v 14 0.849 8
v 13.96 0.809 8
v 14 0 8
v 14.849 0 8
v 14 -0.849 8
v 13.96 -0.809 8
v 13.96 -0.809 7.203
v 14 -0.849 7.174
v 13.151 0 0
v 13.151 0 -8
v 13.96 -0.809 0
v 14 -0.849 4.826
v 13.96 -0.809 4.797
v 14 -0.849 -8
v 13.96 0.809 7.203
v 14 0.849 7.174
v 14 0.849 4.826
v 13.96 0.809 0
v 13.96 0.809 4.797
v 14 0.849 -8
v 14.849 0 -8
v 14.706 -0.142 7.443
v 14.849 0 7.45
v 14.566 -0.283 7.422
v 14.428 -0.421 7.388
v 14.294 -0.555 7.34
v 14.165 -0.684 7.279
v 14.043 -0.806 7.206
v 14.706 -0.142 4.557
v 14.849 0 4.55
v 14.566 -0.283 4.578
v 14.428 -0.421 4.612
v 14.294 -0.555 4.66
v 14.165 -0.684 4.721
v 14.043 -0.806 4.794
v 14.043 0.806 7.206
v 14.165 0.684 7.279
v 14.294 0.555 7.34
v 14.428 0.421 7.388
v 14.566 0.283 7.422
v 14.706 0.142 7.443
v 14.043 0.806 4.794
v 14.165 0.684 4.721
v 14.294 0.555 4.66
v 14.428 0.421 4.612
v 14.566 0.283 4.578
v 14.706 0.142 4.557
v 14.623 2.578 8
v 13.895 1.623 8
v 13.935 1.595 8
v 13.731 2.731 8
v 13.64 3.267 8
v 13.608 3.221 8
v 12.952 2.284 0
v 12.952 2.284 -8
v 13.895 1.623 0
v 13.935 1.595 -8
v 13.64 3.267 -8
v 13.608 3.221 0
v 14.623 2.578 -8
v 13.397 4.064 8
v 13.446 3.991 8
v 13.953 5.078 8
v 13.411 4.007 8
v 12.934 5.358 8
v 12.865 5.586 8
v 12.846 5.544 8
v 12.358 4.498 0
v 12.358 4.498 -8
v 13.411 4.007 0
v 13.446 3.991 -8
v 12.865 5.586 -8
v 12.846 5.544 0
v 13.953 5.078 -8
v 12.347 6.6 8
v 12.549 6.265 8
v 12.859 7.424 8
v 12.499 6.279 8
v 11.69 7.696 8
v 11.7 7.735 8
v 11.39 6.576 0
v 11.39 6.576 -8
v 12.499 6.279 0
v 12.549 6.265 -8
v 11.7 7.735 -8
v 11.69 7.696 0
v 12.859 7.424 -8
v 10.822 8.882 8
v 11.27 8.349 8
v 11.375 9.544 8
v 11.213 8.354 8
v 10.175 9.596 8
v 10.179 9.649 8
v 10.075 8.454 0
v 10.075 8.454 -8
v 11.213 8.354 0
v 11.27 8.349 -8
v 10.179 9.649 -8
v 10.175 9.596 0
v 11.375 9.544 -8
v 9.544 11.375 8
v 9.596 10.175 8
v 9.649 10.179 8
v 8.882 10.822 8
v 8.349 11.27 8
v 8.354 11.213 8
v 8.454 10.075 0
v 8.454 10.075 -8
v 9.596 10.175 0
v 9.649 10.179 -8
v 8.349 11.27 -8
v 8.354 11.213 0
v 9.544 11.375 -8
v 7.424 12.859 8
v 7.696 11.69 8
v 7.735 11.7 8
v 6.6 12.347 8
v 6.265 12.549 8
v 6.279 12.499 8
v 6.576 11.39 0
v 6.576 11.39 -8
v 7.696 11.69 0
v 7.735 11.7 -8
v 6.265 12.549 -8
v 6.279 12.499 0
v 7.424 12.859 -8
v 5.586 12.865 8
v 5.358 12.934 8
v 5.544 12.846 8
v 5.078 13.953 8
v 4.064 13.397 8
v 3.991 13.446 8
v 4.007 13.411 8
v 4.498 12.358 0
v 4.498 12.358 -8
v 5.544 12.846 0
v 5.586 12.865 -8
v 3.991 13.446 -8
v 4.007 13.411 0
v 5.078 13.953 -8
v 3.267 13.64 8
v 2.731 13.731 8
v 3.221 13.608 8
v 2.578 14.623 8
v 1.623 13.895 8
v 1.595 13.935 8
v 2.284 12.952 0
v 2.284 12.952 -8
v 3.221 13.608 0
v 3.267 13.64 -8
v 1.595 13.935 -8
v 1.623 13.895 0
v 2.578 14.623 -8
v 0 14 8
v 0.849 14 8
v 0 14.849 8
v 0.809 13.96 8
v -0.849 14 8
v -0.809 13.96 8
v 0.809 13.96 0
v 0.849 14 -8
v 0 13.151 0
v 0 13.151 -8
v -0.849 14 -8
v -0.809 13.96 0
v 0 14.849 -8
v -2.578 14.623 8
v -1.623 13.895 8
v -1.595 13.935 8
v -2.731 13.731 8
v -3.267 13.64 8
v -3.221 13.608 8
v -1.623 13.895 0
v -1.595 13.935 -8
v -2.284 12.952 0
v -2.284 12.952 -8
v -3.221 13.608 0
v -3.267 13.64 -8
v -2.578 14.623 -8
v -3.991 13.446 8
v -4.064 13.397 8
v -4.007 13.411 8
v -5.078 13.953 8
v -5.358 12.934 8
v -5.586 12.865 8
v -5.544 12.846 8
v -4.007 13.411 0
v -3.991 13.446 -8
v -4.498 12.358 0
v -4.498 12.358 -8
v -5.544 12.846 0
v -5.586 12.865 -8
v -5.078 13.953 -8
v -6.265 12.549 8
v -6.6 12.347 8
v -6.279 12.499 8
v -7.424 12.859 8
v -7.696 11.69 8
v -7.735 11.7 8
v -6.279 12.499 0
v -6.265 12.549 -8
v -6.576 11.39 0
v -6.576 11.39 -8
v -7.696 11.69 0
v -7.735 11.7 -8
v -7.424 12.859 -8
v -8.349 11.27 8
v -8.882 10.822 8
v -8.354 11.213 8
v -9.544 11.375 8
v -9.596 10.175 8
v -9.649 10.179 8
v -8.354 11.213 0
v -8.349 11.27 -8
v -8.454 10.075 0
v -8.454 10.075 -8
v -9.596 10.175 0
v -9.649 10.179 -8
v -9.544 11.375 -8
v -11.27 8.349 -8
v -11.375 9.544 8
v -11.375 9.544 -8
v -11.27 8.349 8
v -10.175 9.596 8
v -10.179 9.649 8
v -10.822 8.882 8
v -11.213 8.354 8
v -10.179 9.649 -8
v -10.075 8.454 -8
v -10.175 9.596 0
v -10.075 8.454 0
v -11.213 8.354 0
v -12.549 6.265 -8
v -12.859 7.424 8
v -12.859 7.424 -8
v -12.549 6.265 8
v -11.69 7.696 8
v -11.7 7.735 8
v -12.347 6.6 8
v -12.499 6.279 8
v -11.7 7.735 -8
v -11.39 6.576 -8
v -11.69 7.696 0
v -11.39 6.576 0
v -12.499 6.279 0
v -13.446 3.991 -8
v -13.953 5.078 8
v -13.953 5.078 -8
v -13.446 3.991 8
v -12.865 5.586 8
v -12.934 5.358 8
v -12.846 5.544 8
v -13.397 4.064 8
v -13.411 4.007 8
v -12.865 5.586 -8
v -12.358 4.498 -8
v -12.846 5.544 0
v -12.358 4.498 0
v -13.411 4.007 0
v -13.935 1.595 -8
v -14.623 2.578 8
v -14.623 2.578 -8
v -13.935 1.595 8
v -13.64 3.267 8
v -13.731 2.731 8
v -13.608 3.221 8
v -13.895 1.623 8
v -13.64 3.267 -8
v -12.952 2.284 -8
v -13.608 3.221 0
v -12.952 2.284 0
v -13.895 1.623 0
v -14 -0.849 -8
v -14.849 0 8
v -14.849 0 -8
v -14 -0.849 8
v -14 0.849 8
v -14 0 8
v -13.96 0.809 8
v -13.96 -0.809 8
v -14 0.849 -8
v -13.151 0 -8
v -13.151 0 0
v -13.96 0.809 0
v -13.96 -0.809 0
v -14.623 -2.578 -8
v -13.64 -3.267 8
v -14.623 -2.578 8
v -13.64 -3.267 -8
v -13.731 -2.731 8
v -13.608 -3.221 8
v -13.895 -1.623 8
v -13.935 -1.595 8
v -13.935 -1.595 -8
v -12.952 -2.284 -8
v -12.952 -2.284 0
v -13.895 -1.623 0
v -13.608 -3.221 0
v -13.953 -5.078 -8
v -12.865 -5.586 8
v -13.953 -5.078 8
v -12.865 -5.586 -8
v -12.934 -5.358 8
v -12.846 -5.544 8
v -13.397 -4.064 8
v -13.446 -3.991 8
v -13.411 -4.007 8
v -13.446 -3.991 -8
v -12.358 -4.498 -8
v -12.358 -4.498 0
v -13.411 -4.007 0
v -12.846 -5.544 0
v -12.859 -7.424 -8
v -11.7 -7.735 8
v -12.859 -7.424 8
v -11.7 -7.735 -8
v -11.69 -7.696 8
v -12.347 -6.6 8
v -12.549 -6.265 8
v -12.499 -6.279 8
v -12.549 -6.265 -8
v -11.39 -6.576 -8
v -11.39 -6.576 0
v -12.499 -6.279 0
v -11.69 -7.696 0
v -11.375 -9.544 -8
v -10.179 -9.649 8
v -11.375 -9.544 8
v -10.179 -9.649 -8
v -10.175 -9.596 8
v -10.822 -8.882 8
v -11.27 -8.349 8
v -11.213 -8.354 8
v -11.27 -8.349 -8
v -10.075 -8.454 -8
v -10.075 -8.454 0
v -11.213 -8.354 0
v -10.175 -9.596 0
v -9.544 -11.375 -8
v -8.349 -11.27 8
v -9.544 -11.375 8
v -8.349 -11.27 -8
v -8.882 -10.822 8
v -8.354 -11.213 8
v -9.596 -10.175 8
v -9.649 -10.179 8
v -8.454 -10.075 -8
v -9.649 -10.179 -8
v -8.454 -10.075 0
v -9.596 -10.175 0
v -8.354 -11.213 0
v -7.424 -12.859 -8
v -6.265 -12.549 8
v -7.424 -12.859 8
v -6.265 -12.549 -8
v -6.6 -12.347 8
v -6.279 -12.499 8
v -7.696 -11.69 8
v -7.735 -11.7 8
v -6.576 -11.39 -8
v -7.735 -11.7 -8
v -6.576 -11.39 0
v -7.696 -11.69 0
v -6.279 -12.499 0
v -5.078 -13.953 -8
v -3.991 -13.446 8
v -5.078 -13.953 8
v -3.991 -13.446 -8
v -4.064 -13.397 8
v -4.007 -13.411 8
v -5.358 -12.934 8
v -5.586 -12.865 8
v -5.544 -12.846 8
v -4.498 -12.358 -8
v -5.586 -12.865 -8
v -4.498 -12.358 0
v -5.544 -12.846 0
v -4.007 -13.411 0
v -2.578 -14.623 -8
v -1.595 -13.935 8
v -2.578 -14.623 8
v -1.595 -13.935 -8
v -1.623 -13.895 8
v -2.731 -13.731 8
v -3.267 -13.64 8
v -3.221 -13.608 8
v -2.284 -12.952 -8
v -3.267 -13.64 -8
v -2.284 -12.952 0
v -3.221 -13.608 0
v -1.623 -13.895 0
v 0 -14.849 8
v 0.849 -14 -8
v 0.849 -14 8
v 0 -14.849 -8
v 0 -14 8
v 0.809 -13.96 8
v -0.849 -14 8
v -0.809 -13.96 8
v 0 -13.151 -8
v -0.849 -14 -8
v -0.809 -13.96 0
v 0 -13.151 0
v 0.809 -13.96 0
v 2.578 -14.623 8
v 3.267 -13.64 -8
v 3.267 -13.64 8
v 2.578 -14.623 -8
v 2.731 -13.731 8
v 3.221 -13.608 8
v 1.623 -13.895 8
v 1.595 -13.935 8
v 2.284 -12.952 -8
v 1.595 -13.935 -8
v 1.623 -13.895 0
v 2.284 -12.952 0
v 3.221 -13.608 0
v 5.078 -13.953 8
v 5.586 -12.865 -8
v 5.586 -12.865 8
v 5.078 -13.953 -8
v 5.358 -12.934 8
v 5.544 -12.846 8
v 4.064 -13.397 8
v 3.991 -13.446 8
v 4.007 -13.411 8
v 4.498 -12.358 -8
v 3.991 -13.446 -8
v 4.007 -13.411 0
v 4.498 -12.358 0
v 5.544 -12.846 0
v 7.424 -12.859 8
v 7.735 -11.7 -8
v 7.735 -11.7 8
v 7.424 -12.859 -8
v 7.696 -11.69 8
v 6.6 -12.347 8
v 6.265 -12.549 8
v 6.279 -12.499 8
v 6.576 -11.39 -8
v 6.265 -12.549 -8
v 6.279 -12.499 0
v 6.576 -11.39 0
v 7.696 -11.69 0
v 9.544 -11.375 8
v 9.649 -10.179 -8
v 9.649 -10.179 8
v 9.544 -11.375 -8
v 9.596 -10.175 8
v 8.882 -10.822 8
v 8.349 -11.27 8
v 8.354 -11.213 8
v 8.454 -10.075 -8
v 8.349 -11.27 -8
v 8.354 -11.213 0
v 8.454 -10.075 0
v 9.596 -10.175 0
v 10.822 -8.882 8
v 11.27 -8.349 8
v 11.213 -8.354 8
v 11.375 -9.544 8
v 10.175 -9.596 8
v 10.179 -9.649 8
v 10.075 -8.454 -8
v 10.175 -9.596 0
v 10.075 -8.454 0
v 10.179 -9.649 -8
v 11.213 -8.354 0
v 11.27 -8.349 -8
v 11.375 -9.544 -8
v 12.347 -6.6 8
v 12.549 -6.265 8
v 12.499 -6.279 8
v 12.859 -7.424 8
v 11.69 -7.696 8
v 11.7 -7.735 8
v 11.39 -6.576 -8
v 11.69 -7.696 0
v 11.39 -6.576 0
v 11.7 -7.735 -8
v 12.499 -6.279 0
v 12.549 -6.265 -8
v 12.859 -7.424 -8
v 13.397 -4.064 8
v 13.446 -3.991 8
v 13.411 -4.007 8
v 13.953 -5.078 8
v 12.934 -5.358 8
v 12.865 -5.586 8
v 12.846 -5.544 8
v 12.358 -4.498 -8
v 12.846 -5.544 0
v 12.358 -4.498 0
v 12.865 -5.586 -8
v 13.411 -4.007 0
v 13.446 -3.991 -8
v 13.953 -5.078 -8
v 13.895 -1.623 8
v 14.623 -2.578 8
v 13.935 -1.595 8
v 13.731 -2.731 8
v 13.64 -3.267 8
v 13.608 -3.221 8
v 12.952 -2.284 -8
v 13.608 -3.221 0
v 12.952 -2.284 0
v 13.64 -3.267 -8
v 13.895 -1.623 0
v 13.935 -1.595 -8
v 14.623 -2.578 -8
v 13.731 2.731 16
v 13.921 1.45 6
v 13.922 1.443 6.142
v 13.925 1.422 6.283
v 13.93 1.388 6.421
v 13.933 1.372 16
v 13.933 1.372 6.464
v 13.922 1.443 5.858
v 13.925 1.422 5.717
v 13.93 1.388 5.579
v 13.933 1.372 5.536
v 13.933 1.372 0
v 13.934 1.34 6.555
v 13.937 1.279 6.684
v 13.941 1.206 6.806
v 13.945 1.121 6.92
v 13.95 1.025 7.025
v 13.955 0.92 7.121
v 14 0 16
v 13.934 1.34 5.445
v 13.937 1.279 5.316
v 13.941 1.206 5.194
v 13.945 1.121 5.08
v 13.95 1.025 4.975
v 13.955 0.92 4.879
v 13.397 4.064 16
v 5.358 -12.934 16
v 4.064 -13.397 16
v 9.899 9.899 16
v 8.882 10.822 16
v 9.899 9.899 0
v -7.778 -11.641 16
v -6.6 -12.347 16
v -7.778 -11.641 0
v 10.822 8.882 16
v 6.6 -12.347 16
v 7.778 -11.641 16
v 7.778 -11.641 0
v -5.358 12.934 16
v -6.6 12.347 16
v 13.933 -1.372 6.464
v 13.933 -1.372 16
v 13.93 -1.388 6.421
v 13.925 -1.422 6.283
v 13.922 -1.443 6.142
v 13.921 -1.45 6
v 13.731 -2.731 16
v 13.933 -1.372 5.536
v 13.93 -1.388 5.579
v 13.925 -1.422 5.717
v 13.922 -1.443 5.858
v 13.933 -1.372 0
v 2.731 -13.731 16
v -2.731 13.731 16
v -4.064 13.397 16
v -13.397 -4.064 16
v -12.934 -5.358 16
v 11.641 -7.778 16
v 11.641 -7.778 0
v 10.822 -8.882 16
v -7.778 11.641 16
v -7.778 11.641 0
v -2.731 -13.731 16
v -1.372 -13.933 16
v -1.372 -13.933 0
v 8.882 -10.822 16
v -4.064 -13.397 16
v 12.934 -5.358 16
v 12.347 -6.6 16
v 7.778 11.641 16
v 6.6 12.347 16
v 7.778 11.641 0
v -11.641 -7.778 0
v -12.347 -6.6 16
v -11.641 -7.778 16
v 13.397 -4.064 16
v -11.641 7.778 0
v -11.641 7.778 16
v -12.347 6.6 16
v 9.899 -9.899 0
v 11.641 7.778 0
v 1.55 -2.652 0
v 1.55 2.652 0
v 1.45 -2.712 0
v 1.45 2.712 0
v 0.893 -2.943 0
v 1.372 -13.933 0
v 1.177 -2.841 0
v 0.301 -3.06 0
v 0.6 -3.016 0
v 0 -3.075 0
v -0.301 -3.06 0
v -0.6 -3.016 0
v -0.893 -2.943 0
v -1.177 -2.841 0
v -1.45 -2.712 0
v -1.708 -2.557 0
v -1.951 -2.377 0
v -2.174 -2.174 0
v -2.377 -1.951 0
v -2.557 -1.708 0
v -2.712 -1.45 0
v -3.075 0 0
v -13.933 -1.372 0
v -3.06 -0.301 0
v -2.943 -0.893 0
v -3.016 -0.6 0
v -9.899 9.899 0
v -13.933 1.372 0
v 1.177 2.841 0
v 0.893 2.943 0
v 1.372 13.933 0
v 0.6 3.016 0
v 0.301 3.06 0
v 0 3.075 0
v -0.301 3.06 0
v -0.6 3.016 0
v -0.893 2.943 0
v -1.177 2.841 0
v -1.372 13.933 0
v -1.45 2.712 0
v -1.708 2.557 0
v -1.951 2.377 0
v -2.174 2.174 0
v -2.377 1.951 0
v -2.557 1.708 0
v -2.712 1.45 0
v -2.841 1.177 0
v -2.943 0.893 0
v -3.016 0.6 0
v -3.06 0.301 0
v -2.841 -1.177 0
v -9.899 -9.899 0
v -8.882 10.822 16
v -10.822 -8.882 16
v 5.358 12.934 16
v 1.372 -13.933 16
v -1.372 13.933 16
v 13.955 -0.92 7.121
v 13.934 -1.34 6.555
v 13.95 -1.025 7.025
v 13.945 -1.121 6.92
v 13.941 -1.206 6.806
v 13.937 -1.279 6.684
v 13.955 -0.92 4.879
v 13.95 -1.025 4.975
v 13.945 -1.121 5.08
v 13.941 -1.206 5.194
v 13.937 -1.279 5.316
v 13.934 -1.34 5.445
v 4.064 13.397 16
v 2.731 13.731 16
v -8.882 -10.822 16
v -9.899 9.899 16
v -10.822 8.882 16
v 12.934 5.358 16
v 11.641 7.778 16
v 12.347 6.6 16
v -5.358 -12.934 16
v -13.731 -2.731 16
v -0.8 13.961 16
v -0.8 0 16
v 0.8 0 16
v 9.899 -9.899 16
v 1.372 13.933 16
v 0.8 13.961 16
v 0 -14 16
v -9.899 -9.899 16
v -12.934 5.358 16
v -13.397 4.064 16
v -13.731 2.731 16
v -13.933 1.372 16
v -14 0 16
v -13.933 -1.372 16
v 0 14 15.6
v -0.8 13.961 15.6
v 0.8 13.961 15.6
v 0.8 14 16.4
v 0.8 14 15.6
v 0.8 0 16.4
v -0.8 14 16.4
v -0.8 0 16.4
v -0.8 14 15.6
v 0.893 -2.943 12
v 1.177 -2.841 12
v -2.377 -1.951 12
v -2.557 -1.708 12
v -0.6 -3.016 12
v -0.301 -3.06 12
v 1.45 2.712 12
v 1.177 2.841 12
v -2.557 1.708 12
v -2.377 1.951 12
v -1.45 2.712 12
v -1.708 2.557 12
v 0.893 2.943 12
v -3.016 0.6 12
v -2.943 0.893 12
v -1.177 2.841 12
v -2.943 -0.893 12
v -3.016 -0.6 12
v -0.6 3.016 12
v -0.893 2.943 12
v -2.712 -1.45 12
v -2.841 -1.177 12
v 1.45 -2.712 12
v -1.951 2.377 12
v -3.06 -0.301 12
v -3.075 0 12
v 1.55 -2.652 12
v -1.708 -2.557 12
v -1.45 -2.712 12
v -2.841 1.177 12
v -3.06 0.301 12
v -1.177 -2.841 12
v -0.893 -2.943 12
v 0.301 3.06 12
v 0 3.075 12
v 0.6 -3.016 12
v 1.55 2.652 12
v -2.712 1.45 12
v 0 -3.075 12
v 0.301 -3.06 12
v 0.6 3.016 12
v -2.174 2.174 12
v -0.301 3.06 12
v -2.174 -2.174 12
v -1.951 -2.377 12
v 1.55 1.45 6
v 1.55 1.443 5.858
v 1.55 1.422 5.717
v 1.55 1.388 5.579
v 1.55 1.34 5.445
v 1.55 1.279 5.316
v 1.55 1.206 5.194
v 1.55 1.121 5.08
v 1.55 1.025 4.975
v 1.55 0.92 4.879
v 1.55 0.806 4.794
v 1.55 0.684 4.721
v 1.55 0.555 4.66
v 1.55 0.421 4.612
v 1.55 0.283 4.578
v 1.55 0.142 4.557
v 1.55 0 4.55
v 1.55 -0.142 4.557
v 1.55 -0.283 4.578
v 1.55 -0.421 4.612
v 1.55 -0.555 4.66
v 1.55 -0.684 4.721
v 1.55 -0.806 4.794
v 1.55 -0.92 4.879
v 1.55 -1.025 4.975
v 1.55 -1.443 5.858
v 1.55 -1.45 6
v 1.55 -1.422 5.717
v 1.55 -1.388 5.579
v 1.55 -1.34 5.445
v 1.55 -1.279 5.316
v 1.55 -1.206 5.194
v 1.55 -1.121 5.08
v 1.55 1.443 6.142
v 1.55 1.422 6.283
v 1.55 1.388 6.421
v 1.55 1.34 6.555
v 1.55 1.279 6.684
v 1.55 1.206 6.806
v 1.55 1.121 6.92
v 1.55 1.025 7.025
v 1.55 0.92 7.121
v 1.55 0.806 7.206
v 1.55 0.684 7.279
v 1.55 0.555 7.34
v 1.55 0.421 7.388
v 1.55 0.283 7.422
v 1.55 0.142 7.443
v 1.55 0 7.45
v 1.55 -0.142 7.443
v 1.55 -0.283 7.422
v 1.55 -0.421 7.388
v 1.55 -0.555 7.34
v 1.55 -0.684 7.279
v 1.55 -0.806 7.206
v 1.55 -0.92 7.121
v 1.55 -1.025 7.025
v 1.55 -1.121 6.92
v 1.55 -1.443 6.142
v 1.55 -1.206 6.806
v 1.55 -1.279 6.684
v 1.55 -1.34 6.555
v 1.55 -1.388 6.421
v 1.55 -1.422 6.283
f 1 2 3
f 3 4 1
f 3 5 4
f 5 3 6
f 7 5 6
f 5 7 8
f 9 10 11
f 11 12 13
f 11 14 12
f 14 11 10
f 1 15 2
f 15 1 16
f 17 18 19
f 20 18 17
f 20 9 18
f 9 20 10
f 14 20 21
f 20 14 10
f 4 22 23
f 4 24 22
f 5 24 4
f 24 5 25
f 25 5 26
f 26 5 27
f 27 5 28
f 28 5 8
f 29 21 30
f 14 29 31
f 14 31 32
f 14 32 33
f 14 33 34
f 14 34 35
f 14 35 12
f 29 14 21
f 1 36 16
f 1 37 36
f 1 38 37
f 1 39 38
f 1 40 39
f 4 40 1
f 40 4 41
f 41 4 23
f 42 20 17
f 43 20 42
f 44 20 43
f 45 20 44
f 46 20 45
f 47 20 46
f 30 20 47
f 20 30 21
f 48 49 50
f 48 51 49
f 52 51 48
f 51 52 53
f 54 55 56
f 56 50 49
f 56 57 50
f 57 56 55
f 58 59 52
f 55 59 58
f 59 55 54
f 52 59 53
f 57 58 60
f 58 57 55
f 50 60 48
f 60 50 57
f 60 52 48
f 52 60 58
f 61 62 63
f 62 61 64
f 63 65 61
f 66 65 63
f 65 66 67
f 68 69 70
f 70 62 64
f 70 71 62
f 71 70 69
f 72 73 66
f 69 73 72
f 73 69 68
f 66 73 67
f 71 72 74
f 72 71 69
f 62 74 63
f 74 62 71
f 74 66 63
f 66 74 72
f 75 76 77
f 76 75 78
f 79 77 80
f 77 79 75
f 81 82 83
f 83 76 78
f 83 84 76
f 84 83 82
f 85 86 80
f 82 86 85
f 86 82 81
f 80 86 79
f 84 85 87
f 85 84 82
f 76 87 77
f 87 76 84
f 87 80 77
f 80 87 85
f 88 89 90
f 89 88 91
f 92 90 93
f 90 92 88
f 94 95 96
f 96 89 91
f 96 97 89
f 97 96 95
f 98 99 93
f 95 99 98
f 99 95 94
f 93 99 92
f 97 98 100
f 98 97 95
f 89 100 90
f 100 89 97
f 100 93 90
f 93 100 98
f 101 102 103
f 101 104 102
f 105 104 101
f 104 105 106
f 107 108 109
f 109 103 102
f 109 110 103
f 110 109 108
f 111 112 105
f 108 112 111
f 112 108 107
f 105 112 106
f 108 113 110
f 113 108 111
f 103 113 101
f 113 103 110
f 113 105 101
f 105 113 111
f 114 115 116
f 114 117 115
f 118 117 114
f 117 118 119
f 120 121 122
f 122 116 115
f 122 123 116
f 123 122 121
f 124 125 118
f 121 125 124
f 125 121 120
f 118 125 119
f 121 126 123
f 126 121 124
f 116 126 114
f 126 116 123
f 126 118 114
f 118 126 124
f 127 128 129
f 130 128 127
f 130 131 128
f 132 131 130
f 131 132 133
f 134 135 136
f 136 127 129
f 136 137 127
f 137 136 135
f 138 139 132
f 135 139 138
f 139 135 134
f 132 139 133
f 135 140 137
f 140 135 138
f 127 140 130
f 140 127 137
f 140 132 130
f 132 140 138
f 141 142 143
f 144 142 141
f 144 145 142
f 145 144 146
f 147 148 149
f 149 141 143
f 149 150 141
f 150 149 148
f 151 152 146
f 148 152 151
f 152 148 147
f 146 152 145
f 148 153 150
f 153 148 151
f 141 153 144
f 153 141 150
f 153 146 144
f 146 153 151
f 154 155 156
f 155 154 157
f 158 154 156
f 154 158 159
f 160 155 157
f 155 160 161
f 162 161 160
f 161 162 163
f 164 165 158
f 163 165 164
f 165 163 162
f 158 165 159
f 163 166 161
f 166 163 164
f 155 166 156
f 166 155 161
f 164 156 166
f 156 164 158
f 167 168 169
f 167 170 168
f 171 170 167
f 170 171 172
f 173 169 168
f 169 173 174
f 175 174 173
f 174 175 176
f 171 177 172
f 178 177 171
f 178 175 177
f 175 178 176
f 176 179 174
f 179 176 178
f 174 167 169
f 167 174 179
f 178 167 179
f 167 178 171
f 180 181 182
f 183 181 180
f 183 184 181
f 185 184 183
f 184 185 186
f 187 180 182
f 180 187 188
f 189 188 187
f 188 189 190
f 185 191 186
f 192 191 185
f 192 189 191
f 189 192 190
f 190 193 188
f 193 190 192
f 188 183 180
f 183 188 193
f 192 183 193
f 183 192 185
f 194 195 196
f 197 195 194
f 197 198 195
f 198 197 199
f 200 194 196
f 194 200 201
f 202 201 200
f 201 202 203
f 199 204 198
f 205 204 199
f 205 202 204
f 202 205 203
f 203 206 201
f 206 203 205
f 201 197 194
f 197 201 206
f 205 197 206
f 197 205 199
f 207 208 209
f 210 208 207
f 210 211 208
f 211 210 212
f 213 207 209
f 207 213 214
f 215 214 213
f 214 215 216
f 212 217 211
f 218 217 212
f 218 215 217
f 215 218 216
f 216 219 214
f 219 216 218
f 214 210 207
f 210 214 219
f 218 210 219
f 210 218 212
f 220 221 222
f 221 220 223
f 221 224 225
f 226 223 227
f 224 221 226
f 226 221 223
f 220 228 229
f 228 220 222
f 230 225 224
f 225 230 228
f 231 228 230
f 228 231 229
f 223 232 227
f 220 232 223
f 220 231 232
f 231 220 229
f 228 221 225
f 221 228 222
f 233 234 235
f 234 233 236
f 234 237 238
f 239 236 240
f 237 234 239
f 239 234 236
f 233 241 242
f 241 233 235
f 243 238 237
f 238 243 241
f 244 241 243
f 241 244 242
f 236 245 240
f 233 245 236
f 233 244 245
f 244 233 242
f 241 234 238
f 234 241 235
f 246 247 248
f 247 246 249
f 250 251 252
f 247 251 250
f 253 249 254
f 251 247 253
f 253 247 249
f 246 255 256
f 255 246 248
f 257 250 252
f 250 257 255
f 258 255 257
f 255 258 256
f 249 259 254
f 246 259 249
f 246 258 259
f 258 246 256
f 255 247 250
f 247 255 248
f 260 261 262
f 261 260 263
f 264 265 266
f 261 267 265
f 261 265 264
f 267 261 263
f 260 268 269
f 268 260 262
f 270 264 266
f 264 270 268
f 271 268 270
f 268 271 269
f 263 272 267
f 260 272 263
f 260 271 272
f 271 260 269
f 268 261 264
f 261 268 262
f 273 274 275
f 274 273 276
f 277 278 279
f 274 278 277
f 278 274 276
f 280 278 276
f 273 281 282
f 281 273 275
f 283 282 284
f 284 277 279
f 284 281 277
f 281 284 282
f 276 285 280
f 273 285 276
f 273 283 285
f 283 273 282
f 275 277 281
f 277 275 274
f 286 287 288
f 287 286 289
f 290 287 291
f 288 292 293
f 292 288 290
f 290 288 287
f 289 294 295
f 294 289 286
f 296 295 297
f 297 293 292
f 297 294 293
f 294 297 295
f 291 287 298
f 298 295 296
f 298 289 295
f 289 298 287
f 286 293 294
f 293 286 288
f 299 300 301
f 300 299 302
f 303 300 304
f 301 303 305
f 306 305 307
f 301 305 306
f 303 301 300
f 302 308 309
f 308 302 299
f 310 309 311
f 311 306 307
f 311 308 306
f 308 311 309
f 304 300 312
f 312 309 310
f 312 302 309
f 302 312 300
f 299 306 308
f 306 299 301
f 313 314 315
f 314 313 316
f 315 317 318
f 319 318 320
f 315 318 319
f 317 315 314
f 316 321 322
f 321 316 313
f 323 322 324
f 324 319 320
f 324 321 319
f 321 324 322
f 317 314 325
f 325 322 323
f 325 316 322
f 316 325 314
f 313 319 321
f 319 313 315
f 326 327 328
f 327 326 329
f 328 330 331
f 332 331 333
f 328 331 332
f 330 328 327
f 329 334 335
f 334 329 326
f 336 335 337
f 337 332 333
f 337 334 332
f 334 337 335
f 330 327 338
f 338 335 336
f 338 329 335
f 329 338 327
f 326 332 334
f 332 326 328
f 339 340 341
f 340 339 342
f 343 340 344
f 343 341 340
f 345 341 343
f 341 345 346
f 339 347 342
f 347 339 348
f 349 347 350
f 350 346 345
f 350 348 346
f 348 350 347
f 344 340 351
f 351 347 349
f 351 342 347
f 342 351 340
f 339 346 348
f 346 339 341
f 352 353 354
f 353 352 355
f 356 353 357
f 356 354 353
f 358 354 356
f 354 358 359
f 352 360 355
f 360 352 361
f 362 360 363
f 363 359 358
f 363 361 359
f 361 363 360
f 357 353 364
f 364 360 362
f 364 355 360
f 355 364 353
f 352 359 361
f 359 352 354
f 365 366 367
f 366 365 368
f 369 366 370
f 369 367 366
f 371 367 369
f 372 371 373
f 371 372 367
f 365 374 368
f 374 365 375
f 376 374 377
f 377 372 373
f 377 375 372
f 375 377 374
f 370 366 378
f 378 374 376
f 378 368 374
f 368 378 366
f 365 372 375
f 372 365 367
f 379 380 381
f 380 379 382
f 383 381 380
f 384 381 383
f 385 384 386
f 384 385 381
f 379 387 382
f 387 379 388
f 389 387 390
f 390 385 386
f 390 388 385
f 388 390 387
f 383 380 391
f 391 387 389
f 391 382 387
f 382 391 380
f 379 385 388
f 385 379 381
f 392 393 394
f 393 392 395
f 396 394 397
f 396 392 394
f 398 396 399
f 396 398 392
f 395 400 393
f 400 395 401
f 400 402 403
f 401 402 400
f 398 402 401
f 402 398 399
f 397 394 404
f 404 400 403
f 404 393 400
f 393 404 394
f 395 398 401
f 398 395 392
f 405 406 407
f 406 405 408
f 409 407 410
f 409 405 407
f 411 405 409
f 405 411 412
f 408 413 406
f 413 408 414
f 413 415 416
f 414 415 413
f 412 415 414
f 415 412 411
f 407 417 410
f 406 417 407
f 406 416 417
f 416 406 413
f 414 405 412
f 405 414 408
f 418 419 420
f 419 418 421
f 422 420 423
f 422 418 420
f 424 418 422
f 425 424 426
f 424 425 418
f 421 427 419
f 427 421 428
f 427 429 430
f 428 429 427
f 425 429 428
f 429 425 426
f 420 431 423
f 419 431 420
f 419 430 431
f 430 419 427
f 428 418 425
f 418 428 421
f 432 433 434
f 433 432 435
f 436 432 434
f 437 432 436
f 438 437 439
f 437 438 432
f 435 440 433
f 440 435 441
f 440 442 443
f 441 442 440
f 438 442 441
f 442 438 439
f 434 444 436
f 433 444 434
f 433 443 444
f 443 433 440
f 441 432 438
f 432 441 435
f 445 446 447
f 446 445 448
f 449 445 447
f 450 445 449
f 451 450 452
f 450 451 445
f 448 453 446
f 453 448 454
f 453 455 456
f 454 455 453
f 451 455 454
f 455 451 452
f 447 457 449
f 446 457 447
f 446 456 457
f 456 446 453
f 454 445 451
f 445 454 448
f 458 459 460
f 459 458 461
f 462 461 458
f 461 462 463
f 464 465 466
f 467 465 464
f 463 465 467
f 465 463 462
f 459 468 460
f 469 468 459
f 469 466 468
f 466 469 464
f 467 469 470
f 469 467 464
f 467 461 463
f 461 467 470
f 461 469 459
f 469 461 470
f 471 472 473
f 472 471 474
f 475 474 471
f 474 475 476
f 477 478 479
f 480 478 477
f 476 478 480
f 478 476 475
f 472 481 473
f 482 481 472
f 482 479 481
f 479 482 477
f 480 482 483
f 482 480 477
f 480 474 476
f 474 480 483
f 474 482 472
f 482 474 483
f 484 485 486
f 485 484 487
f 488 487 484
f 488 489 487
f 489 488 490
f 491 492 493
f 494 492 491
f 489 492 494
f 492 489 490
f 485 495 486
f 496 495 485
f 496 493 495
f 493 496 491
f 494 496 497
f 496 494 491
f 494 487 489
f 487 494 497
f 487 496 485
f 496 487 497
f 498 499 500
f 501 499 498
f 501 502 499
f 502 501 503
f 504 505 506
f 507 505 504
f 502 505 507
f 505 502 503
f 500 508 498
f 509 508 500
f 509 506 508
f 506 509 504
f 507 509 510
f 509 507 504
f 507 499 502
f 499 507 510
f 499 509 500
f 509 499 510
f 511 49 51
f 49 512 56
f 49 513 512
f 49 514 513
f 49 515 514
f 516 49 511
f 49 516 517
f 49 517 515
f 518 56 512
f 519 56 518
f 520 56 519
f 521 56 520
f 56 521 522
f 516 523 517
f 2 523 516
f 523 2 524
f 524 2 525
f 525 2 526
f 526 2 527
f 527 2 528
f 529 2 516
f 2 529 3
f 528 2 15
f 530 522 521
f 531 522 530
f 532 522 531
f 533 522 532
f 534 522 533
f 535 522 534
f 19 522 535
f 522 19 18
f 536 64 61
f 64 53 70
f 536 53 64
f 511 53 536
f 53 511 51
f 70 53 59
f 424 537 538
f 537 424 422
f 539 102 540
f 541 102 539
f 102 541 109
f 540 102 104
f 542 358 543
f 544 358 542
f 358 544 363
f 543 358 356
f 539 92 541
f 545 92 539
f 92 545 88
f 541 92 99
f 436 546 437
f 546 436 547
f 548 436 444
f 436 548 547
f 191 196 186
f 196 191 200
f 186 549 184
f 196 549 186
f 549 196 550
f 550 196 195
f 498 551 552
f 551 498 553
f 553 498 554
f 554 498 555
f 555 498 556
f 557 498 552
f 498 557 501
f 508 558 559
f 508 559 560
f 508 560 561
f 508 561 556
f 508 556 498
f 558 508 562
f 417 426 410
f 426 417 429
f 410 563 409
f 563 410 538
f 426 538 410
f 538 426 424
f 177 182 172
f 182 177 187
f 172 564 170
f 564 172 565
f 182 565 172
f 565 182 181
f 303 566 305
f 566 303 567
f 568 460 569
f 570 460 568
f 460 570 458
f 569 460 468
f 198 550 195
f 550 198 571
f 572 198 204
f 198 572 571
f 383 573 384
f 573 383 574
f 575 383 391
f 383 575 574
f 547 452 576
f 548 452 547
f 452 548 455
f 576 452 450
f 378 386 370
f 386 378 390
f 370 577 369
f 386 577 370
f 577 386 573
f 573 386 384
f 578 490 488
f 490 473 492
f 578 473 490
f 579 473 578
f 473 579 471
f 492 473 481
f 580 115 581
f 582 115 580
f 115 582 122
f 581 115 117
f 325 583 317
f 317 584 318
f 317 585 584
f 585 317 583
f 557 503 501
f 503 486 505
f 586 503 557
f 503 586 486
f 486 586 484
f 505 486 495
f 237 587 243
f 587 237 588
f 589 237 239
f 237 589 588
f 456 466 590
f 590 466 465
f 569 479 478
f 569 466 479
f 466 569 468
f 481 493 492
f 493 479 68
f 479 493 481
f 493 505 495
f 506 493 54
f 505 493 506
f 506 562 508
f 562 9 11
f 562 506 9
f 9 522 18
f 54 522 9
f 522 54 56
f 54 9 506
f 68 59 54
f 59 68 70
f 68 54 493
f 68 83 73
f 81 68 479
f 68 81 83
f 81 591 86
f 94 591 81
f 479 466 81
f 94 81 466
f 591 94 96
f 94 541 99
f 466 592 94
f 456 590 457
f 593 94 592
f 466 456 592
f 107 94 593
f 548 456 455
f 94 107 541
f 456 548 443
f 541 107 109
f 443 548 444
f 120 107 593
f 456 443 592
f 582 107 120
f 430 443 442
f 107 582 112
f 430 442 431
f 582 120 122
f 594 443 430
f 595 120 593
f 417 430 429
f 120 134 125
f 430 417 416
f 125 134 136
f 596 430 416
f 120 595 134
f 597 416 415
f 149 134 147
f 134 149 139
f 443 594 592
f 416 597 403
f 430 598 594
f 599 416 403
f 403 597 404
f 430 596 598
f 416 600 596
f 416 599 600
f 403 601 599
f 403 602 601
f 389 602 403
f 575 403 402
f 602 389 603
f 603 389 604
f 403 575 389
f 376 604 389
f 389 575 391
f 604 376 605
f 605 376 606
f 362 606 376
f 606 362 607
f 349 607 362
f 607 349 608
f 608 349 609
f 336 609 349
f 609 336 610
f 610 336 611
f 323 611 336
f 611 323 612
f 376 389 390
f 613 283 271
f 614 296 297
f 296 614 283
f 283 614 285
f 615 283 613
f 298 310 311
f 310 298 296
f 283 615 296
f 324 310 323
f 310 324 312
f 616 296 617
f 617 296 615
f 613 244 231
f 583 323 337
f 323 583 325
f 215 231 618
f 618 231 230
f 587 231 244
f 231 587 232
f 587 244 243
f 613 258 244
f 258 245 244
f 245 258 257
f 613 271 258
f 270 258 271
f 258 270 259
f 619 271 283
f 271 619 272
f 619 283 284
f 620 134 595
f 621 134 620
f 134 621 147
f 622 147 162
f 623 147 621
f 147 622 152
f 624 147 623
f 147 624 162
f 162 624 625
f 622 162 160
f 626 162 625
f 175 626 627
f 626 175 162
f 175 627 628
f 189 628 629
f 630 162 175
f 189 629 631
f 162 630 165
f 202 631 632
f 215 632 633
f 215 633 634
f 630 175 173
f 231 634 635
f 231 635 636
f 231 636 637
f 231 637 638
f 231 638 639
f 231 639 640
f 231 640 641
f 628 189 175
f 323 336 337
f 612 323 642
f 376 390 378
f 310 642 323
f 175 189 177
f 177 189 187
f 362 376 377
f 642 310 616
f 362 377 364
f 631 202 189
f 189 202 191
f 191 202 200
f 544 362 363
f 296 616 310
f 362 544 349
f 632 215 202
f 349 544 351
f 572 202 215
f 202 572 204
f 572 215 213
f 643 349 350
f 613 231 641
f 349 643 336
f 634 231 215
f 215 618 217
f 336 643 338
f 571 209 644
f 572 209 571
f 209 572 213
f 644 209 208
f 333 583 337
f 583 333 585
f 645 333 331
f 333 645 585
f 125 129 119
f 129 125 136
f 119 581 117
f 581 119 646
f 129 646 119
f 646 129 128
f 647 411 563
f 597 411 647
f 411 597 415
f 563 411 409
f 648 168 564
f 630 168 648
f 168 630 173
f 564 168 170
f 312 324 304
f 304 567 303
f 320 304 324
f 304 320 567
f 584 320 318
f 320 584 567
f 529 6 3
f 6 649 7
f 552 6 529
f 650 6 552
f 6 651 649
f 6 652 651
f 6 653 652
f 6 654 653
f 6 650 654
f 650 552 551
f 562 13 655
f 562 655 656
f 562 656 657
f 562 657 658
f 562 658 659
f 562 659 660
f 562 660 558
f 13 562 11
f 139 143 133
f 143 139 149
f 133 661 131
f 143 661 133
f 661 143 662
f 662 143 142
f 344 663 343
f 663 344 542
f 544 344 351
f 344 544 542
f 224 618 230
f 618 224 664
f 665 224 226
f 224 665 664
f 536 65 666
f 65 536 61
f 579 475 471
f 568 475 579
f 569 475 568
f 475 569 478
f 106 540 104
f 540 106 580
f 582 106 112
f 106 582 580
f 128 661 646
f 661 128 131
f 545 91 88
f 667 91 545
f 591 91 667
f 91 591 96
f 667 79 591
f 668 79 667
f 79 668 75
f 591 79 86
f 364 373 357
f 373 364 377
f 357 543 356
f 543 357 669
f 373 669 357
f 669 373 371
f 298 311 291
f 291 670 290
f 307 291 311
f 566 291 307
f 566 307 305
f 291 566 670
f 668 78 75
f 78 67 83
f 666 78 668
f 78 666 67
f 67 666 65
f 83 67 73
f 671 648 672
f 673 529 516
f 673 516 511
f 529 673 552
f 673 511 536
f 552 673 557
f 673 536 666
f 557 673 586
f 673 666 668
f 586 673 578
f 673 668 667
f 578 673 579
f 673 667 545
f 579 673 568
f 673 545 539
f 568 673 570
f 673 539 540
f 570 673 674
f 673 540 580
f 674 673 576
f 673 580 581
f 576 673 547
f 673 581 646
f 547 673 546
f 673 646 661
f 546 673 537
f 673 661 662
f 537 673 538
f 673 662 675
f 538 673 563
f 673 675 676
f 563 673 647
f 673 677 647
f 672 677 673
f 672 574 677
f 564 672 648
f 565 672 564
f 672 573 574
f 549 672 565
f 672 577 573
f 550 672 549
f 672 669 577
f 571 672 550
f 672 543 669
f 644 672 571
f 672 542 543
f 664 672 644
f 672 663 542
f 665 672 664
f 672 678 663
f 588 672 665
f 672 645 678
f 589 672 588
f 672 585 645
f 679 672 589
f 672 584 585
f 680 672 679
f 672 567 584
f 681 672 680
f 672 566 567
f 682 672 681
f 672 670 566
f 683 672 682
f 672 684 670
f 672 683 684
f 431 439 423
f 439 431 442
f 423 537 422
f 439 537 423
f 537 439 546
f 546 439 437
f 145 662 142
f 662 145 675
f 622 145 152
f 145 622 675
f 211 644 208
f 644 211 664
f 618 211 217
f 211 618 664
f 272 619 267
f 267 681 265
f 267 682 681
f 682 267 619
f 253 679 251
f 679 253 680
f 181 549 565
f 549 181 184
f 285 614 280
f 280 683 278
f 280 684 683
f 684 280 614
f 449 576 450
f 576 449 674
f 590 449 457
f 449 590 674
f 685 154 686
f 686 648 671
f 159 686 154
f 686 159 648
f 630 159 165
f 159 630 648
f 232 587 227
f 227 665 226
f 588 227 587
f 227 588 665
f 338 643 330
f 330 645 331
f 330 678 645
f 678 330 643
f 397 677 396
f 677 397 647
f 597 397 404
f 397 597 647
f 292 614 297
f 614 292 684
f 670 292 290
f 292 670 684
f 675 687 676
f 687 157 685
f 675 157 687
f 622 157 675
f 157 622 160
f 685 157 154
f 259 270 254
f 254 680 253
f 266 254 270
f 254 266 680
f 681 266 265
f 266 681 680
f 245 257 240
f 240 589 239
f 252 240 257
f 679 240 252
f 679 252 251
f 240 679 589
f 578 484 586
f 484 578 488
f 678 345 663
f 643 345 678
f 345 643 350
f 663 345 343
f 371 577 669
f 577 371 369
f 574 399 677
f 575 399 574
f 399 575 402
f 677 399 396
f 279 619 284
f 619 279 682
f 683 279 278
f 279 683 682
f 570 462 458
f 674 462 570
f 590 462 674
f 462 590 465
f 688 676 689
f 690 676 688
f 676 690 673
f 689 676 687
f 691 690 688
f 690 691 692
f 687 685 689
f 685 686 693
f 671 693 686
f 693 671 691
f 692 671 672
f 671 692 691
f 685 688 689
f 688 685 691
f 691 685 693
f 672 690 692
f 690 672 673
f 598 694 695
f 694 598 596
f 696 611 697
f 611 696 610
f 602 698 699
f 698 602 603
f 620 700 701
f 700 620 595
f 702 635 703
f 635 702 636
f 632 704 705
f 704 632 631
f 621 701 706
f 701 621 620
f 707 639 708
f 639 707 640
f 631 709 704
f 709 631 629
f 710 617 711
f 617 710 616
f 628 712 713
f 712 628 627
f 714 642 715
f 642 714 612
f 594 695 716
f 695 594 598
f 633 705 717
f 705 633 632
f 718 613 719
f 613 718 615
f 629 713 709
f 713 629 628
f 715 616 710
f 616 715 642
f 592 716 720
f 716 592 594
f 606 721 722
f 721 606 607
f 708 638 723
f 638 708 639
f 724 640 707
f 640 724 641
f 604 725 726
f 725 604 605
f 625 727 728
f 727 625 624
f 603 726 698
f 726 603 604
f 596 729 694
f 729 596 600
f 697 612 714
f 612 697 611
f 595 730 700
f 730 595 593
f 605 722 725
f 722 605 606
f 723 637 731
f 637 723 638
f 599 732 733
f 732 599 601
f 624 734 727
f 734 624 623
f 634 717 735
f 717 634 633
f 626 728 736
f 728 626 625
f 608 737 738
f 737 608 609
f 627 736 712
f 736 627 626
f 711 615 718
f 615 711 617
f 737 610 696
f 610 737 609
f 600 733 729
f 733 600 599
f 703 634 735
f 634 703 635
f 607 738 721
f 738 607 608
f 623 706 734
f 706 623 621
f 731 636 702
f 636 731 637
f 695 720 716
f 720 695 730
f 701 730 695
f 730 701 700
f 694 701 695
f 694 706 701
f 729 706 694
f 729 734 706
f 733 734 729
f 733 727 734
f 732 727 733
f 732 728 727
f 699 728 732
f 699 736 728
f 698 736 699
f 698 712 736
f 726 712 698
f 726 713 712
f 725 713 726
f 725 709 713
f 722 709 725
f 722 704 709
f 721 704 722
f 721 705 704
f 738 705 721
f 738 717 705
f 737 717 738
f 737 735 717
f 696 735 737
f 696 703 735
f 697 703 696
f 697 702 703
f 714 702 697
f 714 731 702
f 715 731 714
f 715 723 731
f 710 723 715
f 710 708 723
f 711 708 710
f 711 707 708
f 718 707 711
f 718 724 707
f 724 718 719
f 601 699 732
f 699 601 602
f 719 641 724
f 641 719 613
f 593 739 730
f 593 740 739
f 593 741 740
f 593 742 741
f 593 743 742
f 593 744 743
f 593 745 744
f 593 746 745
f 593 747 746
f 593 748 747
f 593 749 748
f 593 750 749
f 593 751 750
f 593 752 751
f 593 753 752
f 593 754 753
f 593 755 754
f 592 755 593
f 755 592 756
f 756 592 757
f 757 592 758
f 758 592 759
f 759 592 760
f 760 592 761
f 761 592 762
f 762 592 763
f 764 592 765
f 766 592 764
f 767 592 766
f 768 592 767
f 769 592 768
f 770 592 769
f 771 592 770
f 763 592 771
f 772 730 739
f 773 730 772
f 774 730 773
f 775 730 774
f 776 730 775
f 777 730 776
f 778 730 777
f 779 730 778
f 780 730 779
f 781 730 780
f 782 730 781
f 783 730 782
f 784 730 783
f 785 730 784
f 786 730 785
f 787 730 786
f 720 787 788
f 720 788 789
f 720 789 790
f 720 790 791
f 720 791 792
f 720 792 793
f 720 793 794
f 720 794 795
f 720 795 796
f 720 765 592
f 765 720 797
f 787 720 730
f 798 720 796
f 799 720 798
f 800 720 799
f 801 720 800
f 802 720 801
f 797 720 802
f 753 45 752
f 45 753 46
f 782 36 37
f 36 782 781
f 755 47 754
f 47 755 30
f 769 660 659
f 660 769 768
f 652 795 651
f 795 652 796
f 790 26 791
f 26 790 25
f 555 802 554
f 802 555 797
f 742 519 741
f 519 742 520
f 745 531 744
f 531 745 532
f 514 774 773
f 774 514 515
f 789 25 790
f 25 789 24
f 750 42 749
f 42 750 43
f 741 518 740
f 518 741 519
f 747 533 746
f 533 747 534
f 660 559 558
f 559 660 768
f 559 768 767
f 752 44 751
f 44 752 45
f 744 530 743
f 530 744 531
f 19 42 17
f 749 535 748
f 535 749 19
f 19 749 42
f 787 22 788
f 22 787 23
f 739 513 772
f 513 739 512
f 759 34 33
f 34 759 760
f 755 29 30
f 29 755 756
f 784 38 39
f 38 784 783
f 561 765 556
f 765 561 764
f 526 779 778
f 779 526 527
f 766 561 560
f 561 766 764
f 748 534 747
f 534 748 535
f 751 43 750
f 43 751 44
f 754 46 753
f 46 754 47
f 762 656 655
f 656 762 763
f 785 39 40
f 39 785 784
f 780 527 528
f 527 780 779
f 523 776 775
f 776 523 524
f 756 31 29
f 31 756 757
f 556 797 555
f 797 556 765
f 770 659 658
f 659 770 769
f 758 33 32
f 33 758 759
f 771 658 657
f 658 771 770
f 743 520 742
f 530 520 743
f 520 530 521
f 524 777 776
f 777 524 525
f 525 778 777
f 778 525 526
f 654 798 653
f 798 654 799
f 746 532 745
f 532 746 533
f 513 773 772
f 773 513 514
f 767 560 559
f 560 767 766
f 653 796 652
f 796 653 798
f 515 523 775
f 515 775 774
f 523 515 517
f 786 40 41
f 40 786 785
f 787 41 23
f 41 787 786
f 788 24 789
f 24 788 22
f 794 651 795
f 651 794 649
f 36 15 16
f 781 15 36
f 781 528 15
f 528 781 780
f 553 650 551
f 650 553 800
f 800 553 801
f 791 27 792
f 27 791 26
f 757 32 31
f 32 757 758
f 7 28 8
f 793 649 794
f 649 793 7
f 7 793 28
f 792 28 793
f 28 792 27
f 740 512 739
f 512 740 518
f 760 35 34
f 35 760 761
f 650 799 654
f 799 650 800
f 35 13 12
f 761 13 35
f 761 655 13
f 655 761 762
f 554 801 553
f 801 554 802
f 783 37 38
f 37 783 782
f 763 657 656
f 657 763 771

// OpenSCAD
// ====================================================================
// PARAMETRIC MAKER FORGE - KNOB & DIAL REPLACEMENT ENGINE
// D-Shaft, 18T/24T Splined, Knurled, Fluted & Set-Screw Retention
// ====================================================================

$fn = 64;

/* [Shaft Fitting] */
Shaft_Profile    = "D_SHAFT"; // [D_SHAFT:D-Shaft Flat, ROUND_SET_SCREW:Smooth Round with M3 Set Screw, SPLINED_18T:18-Tooth Potentiometer Spline, HEX_SHAFT:Hexagonal Socket]
Shaft_Dia        = 6.0;  // 6.0mm or 6.35mm (1/4 inch)
D_Flat_Depth     = 1.5;  // Depth of the D flat
Shaft_Depth      = 12.0; // Engagement depth

/* [Knob Outer Dimensions] */
Knob_Diameter    = 28.0; // [14:1:80]
Knob_Height      = 16.0; // [8:1:50]
Grip_Texture     = "DIAMOND_KNURL"; // [DIAMOND_KNURL:Diamond Knurled, FLUTED_RIBS:Vertical Finger Flutes, SMOOTH_POINTER:Smooth with Indicator Notch]
Rib_Count        = 18;

/* [Pointer & Indicators] */
Enable_Pointer   = true;
Pointer_Style    = "EMBOSSED_LINE"; // [EMBOSSED_LINE:Raised Line, DEBOSSED_DOT:Debossed Dot]

// ====================================================================
// TOP-LEVEL RENDER
// ====================================================================
color([0.25, 0.25, 0.28]) Knob_Assembly();

module Knob_Assembly() {
    difference() {
        union() {
            // Main knob body
            cylinder(d=Knob_Diameter, h=Knob_Height);

            // Grip texture on perimeter
            if (Grip_Texture == "FLUTED_RIBS") {
                for (i = [0 : Rib_Count - 1]) {
                    rotate([0, 0, i * (360 / Rib_Count)])
                        translate([Knob_Diameter / 2, 0, 0])
                        cylinder(d=2.0, h=Knob_Height);
                }
            } else if (Grip_Texture == "DIAMOND_KNURL") {
                for (i = [0 : Rib_Count * 2 - 1]) {
                    rotate([0, 0, i * (180 / Rib_Count)])
                        translate([Knob_Diameter / 2, 0, 0])
                        rotate([0, 0, 45])
                        cube([1.2, 1.2, Knob_Height], center=true);
                }
            }

            // Pointer indicator
            if (Enable_Pointer && Pointer_Style == "EMBOSSED_LINE") {
                translate([0, Knob_Diameter / 4, Knob_Height])
                    cube([1.6, Knob_Diameter / 2, 0.8], center=true);
            }
        }

        // Shaft socket cavity
        translate([0, 0, -1]) {
            if (Shaft_Profile == "D_SHAFT") {
                difference() {
                    cylinder(d=Shaft_Dia + 0.15, h=Shaft_Depth + 1);
                    translate([Shaft_Dia / 2 - D_Flat_Depth + 0.05, -Shaft_Dia, 0])
                        cube([Shaft_Dia, Shaft_Dia * 2, Shaft_Depth + 2]);
                }
            } else if (Shaft_Profile == "ROUND_SET_SCREW") {
                cylinder(d=Shaft_Dia + 0.15, h=Shaft_Depth + 1);
            } else if (Shaft_Profile == "HEX_SHAFT") {
                cylinder(d=(Shaft_Dia + 0.2) / cos(30), h=Shaft_Depth + 1, $fn=6);
            } else if (Shaft_Profile == "SPLINED_18T") {
                cylinder(d=Shaft_Dia + 0.1, h=Shaft_Depth + 1);
                for (a = [0 : 20 : 360]) {
                    rotate([0, 0, a]) translate([Shaft_Dia / 2, 0, 0]) cylinder(d=0.8, h=Shaft_Depth + 1);
                }
            }
        }

        // Radial M3 set-screw hole
        if (Shaft_Profile == "ROUND_SET_SCREW" || Shaft_Profile == "D_SHAFT") {
            translate([0, 0, Shaft_Depth / 2])
                rotate([0, 90, 0])
                cylinder(d=2.9, h=Knob_Diameter / 2 + 1); // M3 tap hole
        }

        // Debossed pointer dot
        if (Enable_Pointer && Pointer_Style == "DEBOSSED_DOT") {
            translate([0, Knob_Diameter / 2 - 3.5, Knob_Height - 0.6])
                cylinder(d=2.0, h=1.0);
        }
    }
}
